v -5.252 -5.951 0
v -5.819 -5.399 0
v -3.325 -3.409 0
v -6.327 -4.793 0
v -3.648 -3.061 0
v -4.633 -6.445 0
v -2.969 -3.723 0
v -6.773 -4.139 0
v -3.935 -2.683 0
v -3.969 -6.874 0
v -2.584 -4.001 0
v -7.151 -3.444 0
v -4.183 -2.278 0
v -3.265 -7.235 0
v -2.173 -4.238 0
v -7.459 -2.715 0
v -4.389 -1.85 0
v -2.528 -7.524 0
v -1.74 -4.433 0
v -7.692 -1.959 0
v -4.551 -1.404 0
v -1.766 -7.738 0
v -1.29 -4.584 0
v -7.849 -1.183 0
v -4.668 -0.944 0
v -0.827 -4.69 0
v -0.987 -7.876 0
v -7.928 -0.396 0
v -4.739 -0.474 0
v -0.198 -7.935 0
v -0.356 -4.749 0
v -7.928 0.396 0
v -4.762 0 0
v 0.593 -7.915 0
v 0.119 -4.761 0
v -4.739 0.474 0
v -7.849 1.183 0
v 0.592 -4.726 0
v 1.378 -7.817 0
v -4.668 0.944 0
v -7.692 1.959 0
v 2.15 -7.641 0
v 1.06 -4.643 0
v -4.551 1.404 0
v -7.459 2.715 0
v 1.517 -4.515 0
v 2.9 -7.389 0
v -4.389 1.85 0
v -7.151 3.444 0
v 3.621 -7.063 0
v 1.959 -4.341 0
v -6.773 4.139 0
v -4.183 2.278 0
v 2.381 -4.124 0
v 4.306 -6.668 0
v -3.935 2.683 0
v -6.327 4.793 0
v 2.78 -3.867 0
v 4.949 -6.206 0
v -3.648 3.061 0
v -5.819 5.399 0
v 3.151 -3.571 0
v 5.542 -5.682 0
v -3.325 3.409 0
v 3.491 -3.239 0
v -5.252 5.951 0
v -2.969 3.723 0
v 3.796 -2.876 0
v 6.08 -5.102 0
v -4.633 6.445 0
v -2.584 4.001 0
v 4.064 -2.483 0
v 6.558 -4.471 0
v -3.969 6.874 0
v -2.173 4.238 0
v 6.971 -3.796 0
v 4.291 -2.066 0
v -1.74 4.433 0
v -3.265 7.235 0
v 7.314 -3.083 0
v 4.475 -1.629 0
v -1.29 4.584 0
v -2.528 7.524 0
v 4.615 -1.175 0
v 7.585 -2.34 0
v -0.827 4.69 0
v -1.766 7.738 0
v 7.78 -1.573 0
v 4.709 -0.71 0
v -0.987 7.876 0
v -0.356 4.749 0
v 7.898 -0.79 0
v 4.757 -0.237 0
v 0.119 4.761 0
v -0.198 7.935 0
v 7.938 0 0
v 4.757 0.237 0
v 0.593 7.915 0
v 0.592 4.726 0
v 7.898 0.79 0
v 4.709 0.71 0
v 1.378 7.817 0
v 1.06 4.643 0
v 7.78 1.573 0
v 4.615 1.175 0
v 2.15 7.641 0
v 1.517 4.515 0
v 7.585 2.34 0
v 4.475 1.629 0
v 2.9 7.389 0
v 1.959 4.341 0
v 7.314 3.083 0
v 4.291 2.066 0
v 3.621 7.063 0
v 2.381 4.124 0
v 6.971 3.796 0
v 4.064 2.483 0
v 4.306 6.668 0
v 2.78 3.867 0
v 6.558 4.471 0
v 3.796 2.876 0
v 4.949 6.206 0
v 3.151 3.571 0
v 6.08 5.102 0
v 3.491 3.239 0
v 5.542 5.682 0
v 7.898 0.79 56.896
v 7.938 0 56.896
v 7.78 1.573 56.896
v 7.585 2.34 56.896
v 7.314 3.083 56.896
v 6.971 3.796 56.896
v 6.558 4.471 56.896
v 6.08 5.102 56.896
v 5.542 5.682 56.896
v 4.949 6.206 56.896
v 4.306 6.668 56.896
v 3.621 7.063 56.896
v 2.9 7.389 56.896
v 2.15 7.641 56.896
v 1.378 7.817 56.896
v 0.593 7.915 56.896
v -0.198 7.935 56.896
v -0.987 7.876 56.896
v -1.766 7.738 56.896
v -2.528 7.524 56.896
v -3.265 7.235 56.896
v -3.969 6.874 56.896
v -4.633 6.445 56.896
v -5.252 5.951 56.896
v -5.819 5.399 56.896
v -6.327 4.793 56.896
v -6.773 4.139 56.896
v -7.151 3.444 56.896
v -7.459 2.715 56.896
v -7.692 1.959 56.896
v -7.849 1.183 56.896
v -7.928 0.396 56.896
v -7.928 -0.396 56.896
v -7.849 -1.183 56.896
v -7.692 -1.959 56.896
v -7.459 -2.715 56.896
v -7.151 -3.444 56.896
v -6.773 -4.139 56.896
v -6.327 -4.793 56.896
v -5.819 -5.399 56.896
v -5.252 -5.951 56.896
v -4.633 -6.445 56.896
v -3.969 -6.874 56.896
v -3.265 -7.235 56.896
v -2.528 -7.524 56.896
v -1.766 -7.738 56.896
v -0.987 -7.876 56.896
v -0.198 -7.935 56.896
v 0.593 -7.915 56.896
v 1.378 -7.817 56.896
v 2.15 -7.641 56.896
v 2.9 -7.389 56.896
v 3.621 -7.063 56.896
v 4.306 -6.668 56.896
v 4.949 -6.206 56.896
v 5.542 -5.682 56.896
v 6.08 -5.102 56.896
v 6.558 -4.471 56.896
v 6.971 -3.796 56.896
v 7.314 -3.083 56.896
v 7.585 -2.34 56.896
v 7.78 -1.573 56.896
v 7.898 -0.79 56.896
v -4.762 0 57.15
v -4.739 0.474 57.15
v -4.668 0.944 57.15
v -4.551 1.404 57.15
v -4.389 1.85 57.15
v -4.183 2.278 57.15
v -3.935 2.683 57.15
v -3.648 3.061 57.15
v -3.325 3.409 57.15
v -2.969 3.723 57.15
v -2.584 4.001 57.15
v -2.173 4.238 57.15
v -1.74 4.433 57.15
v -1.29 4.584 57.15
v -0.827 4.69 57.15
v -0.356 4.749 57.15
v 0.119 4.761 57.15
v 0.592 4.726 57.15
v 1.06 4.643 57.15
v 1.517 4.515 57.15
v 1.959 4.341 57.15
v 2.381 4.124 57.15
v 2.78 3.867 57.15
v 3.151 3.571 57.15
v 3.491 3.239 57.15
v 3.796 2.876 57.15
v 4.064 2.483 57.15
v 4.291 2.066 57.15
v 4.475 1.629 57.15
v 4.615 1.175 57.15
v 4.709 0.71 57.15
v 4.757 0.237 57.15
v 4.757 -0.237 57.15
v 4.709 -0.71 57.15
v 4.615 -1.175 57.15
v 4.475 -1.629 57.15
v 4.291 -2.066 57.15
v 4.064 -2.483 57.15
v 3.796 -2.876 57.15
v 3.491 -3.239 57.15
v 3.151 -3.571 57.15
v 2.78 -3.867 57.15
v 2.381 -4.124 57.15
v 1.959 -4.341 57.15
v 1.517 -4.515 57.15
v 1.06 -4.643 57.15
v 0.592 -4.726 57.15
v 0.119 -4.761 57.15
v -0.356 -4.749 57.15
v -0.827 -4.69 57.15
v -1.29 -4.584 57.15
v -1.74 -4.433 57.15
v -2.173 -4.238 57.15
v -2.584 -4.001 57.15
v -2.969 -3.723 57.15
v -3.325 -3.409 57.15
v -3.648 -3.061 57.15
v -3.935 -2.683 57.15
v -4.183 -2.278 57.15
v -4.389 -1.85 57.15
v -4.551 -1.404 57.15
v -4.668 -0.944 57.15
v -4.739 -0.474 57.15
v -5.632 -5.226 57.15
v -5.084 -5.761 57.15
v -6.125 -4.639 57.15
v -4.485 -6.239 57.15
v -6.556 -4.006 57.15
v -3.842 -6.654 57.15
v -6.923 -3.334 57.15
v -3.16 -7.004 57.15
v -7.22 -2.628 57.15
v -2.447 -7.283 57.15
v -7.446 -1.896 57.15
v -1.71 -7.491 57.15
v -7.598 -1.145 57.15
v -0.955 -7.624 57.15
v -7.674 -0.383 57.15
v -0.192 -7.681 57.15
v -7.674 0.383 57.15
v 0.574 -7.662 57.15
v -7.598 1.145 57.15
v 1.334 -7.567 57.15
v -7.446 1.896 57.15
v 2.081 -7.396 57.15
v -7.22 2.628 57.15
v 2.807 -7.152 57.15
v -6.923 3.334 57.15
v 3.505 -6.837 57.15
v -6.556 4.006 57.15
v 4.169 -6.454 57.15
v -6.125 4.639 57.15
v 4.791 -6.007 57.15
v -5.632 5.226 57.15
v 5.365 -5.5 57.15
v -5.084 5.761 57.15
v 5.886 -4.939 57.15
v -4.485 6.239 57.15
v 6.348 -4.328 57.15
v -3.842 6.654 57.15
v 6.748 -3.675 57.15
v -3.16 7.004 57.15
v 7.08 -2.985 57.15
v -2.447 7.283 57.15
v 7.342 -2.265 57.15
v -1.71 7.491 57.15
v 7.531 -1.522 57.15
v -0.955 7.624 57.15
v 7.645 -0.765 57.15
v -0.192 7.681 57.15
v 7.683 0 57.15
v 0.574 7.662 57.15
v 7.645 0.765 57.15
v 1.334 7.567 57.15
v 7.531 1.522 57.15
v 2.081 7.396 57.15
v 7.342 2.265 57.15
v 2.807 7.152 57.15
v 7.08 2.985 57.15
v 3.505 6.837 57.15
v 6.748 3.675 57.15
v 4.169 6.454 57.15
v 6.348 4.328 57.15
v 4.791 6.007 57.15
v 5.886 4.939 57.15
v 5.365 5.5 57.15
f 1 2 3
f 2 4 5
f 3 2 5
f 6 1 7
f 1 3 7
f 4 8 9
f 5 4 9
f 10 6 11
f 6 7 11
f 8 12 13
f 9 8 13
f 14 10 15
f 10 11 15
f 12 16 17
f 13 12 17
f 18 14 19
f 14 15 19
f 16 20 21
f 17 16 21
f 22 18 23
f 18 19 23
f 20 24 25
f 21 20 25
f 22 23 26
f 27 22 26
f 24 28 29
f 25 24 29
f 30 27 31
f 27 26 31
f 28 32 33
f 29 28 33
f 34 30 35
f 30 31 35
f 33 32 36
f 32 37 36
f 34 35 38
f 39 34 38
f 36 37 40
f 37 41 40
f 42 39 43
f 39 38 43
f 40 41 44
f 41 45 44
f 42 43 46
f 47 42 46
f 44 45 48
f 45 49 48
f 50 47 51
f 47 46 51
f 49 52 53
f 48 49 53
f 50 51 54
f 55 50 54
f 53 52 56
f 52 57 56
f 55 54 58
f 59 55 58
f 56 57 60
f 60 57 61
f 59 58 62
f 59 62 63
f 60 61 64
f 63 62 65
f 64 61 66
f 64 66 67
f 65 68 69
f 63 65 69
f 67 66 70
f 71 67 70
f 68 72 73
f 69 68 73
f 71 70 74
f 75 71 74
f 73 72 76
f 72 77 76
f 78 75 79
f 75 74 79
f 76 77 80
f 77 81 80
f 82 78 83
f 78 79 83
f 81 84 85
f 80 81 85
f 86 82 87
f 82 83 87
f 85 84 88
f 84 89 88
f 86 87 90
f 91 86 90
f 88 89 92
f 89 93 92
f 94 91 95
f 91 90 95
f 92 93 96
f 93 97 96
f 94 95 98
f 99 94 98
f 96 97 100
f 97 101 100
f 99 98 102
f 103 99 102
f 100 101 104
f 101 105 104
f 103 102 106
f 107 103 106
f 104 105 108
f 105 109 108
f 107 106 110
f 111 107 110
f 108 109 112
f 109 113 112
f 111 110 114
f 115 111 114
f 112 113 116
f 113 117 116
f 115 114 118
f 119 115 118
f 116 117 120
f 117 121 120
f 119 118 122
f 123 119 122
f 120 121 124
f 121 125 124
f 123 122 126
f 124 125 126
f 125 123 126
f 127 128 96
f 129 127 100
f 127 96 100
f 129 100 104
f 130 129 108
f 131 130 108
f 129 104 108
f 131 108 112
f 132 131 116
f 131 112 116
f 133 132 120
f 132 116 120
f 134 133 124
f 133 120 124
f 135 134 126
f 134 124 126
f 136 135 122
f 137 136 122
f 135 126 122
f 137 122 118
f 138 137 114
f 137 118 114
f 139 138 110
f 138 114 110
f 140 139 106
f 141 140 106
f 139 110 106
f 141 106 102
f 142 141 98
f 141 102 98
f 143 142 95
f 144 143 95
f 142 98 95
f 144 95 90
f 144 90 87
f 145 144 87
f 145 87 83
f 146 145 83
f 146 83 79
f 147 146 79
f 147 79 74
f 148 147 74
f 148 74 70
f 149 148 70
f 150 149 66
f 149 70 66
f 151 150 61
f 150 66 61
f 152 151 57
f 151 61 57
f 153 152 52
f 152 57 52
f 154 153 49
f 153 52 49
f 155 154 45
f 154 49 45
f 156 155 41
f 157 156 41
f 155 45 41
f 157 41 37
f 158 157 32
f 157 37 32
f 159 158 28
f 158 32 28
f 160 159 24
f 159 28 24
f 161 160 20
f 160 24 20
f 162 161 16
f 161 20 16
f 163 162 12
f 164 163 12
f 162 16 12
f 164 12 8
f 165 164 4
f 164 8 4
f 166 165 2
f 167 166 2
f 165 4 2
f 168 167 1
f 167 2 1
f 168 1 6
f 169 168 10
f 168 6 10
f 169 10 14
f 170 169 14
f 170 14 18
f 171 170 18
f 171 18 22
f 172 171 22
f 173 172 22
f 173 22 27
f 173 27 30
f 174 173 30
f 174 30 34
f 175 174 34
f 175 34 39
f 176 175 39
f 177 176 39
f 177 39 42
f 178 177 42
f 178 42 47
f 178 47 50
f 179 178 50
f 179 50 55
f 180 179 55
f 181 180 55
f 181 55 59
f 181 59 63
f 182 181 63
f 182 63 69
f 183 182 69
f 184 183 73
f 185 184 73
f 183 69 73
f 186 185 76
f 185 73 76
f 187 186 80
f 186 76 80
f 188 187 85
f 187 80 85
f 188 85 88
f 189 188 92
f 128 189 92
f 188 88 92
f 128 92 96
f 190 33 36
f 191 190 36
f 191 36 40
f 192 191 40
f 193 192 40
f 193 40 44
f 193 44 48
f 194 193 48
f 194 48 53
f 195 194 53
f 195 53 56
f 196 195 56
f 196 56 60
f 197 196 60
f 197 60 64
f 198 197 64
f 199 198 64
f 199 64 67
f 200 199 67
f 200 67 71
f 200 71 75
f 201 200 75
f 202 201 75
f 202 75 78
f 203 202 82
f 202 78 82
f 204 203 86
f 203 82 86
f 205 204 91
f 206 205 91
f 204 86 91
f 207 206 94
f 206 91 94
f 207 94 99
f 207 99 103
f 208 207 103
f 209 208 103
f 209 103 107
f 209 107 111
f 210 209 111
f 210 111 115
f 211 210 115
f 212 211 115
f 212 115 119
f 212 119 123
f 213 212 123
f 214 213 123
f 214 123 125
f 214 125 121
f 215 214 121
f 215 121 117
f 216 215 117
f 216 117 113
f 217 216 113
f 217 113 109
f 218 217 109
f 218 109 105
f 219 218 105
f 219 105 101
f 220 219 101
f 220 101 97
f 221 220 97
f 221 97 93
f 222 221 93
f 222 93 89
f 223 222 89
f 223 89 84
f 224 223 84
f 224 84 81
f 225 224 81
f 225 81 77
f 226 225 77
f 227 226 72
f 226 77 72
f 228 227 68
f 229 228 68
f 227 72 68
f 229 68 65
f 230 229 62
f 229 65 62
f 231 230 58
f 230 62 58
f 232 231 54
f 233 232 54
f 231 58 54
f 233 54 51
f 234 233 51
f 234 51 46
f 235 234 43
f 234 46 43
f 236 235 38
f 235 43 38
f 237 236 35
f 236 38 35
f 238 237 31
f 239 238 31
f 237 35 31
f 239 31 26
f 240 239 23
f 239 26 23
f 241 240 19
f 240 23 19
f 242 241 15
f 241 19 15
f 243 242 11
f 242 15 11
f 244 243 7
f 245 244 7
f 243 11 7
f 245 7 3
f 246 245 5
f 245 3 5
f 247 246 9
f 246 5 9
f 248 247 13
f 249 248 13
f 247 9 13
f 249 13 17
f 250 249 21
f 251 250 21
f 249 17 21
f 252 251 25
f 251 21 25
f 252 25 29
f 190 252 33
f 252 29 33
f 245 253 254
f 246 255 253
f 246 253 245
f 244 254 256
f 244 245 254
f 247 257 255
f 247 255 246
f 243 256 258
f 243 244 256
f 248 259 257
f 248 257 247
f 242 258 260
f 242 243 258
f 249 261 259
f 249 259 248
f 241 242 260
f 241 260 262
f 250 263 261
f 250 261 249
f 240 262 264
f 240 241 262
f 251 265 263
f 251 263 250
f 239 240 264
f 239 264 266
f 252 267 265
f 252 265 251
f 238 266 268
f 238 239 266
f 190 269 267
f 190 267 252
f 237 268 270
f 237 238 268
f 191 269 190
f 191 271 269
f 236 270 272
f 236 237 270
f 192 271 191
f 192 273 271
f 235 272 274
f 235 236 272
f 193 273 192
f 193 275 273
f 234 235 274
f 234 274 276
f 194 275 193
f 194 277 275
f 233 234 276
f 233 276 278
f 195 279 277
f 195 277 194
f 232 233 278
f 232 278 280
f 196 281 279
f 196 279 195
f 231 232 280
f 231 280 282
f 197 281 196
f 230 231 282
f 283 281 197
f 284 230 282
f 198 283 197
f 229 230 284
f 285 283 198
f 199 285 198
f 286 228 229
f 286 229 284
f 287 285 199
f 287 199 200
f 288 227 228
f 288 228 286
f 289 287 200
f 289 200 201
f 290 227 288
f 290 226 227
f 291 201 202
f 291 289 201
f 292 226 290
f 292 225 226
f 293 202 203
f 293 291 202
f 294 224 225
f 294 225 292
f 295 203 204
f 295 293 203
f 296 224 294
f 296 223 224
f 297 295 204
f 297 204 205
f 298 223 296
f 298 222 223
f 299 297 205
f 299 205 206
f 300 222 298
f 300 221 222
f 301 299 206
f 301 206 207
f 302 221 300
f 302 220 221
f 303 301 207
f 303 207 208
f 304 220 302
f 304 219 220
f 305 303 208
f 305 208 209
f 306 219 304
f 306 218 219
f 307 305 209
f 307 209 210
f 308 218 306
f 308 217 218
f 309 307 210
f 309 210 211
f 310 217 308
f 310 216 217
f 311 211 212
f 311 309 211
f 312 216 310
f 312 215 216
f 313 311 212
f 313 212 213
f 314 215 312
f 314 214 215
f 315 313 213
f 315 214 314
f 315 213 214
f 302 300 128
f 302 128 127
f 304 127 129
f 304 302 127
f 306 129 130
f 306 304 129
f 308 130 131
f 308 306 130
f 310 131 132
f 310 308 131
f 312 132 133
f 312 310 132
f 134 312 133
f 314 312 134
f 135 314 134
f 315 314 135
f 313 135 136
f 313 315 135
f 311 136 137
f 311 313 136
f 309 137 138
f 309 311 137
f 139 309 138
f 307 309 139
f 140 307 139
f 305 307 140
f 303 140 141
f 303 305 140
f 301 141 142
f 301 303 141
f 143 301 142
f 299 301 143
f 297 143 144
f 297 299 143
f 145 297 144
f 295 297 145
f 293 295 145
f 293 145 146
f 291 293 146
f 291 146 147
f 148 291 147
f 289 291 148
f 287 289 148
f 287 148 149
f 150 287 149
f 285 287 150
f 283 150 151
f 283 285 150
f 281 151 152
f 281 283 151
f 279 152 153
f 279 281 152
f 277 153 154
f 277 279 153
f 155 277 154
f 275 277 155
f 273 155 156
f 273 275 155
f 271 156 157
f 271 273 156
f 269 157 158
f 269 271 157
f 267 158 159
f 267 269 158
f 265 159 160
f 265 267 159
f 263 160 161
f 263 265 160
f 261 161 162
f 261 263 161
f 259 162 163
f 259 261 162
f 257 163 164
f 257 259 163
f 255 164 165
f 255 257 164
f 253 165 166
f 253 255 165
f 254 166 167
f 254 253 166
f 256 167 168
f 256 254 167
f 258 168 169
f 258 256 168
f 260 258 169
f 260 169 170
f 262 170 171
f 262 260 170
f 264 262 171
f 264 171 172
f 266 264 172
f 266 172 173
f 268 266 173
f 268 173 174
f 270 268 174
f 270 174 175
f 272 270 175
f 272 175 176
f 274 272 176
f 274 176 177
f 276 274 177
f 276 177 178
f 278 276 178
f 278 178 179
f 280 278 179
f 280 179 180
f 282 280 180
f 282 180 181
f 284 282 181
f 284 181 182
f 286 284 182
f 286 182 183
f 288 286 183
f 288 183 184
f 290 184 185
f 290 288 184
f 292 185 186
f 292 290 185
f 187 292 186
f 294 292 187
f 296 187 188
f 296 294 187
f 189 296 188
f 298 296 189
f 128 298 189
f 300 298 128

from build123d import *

# Parameters (mm, degrees)
SKETCH1_R                   = 7.9375
BOSS_EXTRUDE1_DEPTH         = 57.15
CHAMFER1_SIZE               = 0.254
F_5_16_0_3125_DOWEL_HOLE1_D = 9.525


with BuildPart() as part:
    # Sketch1 → Boss-Extrude1 (new body)
    with BuildSketch(Plane.XY):
        Circle(SKETCH1_R)
    extrude(amount=BOSS_EXTRUDE1_DEPTH)

    # Chamfer1
    chamfer1_edges = [part.edges().sort_by_distance(p)[0] for p in [
        (-7.9375, 0, 57.15),
    ]]
    chamfer(chamfer1_edges, length=CHAMFER1_SIZE)

    # 5/16 (0.3125) Dowel Hole1 (through all)
    with Locations(Plane.XY.offset(57.15)):
        with Locations((0, 0)):
            Hole(F_5_16_0_3125_DOWEL_HOLE1_D / 2)


solid = part.part
